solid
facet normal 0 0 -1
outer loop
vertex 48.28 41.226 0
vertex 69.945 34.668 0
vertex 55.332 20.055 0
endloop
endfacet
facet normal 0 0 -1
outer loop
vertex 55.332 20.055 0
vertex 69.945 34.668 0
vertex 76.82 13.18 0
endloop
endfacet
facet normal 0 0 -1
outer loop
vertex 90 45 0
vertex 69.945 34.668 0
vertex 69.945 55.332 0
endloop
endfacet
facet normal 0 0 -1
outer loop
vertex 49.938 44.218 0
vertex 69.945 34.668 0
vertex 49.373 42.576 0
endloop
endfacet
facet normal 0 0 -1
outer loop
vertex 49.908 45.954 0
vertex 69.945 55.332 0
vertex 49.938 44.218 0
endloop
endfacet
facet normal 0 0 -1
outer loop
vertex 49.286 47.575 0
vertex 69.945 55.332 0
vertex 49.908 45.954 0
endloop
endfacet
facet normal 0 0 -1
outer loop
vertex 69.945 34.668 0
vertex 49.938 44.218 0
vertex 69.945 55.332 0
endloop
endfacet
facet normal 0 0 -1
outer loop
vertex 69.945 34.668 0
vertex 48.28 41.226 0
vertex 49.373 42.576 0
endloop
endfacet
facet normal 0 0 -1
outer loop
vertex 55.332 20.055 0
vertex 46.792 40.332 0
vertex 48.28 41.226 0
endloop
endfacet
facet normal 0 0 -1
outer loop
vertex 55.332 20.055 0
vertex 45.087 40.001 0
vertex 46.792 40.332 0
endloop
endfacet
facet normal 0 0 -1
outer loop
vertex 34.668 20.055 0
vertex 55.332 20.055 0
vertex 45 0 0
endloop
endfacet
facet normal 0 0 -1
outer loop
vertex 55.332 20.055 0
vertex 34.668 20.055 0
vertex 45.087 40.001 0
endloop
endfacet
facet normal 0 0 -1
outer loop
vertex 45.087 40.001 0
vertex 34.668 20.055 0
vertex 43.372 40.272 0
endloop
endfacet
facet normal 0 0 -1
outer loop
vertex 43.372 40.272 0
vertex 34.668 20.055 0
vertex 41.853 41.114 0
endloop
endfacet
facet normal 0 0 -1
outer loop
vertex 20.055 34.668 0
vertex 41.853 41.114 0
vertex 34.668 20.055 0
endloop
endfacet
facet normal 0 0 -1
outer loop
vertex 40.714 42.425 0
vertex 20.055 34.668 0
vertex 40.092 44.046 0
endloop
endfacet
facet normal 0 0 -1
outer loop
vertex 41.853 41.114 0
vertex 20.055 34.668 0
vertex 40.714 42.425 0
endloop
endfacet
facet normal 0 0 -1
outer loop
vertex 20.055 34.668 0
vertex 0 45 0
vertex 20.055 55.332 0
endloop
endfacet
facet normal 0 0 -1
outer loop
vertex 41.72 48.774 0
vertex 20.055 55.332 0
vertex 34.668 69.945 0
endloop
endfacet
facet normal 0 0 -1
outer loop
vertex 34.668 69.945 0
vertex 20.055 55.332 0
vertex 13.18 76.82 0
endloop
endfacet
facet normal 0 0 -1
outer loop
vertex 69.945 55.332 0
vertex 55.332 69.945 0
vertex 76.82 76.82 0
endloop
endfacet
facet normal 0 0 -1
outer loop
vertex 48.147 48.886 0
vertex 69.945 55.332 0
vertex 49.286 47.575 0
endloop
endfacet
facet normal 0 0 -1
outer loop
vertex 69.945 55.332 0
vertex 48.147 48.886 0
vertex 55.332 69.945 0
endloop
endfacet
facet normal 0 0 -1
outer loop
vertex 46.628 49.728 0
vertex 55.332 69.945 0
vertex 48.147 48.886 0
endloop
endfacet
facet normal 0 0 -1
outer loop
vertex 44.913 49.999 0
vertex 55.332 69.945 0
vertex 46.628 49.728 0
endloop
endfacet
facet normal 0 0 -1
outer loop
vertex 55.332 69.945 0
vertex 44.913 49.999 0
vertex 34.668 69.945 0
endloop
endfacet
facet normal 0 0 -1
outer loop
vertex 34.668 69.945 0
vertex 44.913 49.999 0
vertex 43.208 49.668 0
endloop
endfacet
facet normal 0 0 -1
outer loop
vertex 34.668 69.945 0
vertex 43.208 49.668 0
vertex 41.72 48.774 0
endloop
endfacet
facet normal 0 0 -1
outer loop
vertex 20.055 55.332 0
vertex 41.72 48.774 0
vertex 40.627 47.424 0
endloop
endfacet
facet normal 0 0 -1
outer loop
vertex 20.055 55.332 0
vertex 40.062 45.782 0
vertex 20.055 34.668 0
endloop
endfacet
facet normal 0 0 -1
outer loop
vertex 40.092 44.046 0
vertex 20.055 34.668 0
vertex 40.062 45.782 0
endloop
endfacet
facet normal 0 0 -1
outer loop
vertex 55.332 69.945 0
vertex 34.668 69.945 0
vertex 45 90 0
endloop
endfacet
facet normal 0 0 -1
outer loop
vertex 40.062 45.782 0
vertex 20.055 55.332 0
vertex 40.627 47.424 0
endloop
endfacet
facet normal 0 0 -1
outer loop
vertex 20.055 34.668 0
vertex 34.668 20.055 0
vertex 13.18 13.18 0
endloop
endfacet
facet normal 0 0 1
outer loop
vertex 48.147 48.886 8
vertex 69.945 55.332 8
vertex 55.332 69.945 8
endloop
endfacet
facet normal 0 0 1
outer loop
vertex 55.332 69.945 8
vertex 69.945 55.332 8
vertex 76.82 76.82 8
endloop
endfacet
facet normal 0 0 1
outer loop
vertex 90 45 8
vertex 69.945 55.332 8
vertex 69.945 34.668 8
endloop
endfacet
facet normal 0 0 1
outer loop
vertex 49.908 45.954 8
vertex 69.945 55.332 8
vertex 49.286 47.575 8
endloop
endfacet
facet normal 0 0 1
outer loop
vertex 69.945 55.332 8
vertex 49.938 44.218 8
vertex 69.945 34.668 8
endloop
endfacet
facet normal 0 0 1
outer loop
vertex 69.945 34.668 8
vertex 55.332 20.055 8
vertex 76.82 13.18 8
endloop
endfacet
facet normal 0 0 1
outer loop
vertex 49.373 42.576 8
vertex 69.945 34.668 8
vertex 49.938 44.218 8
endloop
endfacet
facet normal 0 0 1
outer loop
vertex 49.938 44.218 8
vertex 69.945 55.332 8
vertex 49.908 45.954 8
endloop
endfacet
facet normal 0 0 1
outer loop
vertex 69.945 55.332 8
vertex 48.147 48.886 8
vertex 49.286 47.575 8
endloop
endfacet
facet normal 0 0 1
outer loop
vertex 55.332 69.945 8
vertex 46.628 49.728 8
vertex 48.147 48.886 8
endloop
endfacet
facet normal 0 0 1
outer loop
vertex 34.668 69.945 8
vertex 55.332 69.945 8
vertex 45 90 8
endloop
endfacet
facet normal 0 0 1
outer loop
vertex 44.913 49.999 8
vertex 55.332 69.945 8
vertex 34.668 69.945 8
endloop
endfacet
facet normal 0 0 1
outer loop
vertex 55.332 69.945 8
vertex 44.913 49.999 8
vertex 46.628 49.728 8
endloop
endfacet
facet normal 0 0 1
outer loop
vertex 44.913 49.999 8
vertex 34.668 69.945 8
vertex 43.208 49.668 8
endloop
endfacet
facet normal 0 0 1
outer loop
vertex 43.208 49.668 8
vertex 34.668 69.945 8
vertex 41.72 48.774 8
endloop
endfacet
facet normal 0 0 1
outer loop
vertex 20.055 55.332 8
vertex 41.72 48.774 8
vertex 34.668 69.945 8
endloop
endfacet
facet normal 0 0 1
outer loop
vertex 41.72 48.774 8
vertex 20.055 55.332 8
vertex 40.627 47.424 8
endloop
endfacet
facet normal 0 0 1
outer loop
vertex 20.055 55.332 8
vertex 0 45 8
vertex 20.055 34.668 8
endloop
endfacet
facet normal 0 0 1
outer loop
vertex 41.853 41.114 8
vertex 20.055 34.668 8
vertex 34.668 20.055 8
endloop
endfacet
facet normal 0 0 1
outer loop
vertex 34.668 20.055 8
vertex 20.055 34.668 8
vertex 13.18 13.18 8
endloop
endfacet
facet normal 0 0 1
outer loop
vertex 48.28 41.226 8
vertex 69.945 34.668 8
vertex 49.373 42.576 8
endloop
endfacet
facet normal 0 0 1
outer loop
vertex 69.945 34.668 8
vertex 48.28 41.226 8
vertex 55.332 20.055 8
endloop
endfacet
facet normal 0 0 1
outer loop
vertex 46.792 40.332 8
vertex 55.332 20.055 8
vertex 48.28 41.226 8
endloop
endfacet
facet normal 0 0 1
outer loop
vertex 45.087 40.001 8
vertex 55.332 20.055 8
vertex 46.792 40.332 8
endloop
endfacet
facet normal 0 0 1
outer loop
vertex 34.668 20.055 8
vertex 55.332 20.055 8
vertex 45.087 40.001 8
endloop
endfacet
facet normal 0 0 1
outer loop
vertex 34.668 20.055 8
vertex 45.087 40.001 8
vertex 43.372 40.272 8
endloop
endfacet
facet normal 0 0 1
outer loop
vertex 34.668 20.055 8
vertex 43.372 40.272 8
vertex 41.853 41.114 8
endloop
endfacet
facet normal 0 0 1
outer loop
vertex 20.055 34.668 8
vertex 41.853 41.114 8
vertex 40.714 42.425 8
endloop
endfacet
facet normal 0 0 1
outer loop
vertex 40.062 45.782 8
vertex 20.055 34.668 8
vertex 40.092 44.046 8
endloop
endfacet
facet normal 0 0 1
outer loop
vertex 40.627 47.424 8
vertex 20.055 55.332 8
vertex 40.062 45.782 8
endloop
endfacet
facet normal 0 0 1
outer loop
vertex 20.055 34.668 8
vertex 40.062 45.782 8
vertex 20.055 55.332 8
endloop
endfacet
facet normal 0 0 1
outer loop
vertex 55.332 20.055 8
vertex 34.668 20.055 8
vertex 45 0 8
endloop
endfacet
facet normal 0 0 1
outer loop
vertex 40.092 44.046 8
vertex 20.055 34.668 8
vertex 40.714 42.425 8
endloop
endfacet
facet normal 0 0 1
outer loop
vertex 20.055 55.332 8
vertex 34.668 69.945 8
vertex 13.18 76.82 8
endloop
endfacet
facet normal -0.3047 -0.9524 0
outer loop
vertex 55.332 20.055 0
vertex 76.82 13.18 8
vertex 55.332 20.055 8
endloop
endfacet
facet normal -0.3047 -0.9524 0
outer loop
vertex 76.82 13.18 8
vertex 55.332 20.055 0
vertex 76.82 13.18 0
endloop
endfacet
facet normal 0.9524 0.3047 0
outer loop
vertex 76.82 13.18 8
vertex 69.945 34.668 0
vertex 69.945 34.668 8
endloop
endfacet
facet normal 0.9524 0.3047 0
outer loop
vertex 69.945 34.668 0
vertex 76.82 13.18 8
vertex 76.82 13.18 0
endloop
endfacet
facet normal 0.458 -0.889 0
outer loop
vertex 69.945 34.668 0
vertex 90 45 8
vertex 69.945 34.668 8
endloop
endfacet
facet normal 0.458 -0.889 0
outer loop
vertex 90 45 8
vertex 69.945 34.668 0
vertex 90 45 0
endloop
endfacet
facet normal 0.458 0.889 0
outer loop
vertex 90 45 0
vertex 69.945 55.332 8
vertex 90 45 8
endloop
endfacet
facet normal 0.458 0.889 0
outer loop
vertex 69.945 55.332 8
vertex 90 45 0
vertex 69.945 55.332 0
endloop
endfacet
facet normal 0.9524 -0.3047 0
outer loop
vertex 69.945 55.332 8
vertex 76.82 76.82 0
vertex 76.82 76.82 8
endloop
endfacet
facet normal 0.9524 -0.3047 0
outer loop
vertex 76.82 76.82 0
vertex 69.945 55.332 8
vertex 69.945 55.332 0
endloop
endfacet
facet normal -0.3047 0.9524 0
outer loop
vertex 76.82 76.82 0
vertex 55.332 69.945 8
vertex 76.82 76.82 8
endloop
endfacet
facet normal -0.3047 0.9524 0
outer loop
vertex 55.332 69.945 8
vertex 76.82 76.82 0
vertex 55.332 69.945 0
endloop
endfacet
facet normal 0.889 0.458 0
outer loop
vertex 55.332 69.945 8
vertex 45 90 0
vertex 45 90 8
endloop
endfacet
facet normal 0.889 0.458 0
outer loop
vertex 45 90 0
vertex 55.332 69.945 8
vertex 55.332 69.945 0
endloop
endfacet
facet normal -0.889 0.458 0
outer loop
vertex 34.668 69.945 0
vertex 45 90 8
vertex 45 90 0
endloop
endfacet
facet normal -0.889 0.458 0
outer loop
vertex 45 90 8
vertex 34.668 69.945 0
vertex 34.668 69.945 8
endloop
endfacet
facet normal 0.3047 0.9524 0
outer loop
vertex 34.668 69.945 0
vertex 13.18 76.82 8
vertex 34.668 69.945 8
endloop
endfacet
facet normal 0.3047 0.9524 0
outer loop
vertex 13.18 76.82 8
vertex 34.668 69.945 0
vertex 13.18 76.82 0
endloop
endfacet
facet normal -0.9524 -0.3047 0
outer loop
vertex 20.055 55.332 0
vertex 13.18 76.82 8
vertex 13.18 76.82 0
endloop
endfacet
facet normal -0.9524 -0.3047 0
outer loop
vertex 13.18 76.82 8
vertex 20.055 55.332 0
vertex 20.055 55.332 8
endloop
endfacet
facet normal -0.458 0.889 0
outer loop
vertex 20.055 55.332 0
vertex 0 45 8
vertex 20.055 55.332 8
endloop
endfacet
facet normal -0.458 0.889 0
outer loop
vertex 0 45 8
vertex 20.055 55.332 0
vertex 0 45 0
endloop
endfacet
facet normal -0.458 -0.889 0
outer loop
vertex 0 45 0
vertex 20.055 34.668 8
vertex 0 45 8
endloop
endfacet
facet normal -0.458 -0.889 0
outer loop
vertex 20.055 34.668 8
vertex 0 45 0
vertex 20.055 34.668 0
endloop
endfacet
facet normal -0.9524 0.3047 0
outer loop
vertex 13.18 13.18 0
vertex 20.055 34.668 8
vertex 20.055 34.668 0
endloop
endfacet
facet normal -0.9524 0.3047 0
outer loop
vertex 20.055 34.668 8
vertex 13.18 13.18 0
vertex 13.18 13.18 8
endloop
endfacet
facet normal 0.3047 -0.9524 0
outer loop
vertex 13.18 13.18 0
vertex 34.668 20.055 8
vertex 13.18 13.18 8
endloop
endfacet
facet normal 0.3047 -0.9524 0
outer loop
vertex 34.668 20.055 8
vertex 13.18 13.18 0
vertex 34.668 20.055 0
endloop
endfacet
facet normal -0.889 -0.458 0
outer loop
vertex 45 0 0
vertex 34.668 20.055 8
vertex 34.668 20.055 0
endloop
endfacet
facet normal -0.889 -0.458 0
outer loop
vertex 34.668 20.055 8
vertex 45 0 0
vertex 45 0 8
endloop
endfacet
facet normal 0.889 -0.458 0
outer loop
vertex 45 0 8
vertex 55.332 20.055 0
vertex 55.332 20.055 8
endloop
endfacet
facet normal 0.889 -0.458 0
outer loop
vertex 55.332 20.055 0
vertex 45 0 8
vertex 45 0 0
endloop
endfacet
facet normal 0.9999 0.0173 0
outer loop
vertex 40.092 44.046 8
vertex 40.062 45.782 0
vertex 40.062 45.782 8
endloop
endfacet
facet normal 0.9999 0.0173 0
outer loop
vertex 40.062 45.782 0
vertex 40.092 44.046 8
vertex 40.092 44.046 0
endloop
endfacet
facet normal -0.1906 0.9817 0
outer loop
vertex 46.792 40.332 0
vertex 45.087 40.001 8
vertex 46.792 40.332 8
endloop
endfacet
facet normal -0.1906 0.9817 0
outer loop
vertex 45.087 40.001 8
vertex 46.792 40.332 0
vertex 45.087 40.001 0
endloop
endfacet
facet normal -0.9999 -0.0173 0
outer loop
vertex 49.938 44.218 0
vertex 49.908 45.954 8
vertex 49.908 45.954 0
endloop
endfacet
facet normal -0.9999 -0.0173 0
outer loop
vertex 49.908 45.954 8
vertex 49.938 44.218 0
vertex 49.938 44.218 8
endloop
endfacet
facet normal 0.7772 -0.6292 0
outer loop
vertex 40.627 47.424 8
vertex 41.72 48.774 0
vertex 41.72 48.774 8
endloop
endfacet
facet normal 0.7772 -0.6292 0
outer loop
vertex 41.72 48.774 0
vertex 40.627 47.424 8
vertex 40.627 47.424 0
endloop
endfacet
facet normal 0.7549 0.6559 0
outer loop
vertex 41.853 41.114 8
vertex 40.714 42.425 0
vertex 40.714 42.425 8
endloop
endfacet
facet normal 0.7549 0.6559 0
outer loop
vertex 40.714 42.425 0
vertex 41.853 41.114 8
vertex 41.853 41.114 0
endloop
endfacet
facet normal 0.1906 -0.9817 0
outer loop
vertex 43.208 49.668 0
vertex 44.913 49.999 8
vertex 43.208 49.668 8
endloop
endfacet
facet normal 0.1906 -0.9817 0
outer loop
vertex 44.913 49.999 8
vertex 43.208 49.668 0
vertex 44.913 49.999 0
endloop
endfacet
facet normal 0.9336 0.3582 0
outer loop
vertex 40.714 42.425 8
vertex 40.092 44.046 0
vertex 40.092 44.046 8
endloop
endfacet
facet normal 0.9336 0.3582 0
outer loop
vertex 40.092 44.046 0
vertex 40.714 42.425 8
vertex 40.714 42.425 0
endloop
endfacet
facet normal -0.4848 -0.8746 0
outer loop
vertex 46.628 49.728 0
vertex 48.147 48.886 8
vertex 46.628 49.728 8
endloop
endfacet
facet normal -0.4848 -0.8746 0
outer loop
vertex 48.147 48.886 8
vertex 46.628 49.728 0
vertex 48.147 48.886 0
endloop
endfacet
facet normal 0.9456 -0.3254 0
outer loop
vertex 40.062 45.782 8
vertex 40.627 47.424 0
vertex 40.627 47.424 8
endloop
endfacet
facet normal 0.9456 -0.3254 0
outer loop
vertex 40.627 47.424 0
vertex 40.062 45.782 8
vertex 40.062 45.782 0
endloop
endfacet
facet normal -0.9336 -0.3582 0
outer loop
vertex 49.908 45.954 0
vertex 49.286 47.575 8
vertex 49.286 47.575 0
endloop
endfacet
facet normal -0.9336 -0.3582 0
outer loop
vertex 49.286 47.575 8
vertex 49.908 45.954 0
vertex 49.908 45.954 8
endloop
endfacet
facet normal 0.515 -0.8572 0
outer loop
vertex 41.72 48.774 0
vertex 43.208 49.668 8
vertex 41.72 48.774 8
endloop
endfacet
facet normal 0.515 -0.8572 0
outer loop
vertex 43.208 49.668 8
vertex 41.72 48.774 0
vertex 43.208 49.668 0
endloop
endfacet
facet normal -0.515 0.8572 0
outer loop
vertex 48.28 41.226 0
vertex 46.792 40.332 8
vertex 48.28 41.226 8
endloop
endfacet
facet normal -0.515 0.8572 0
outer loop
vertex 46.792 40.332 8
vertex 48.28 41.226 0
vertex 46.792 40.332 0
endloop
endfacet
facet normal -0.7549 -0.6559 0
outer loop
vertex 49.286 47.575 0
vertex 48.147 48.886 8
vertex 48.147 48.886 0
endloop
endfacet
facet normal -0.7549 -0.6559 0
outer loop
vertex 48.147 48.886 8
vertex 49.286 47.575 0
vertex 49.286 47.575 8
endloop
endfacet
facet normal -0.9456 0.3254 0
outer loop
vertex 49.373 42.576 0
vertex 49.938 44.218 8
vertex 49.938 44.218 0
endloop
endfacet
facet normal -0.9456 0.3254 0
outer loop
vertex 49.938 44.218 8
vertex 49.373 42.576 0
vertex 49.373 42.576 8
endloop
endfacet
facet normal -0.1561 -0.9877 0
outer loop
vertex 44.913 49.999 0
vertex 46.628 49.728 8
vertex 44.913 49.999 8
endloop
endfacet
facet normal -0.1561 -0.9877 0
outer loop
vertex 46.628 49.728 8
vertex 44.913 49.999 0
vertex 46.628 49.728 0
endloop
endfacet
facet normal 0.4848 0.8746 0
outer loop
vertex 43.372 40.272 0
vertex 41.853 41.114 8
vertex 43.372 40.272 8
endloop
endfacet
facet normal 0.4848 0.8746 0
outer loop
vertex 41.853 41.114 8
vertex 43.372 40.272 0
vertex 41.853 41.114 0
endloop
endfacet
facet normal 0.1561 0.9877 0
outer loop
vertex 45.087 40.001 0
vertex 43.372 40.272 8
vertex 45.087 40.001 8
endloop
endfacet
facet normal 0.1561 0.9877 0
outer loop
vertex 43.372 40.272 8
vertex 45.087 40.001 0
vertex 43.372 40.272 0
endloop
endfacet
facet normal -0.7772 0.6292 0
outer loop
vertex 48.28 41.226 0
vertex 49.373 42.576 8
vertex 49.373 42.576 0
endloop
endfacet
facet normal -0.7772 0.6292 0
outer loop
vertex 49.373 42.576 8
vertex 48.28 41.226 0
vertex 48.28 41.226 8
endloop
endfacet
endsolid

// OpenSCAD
$fn = 32;

// ----------------------------------------------------------------------
// Star wheel: 8-point star, R45
// ----------------------------------------------------------------------

// --- parameters (mm) ---
n_points = 8;             // number of points / teeth
r_out = 45;               // tip radius
r_in = 27;                // root radius
bore_r = 5;               // centre bore radius
plate_t = 8;              // plate thickness, Z (extrusion height)
bore_d = 10;              // centre bore diameter
fit_tol = 0.05;           // declared fit tolerance (prompt contract)
free_tol = 0.3;           // declared free tolerance (prompt contract)

profile = [[90, 45], [69.945, 55.332], [76.82, 76.82], [55.332, 69.945], [45, 90], [34.668, 69.945], [13.18, 76.82], [20.055, 55.332], [0, 45], [20.055, 34.668], [13.18, 13.18], [34.668, 20.055], [45, 0], [55.332, 20.055], [76.82, 13.18], [69.945, 34.668]];  // primary outline, 16 points, counter clockwise
void_1 = [[49.908, 45.954], [49.286, 47.575], [48.147, 48.886], [46.628, 49.728], [44.913, 49.999], [43.208, 49.668], [41.72, 48.774], [40.627, 47.424], [40.062, 45.782], [40.092, 44.046], [40.714, 42.425], [41.853, 41.114], [43.372, 40.272], [45.087, 40.001], [46.792, 40.332], [48.28, 41.226], [49.373, 42.576], [49.938, 44.218]];  // centre bore, 18 points

// --- the one profile operation ---
difference() {
  linear_extrude(height = plate_t) polygon(points = profile);
  translate([0, 0, -1])
    linear_extrude(height = plate_t + 2) polygon(points = void_1);
}
